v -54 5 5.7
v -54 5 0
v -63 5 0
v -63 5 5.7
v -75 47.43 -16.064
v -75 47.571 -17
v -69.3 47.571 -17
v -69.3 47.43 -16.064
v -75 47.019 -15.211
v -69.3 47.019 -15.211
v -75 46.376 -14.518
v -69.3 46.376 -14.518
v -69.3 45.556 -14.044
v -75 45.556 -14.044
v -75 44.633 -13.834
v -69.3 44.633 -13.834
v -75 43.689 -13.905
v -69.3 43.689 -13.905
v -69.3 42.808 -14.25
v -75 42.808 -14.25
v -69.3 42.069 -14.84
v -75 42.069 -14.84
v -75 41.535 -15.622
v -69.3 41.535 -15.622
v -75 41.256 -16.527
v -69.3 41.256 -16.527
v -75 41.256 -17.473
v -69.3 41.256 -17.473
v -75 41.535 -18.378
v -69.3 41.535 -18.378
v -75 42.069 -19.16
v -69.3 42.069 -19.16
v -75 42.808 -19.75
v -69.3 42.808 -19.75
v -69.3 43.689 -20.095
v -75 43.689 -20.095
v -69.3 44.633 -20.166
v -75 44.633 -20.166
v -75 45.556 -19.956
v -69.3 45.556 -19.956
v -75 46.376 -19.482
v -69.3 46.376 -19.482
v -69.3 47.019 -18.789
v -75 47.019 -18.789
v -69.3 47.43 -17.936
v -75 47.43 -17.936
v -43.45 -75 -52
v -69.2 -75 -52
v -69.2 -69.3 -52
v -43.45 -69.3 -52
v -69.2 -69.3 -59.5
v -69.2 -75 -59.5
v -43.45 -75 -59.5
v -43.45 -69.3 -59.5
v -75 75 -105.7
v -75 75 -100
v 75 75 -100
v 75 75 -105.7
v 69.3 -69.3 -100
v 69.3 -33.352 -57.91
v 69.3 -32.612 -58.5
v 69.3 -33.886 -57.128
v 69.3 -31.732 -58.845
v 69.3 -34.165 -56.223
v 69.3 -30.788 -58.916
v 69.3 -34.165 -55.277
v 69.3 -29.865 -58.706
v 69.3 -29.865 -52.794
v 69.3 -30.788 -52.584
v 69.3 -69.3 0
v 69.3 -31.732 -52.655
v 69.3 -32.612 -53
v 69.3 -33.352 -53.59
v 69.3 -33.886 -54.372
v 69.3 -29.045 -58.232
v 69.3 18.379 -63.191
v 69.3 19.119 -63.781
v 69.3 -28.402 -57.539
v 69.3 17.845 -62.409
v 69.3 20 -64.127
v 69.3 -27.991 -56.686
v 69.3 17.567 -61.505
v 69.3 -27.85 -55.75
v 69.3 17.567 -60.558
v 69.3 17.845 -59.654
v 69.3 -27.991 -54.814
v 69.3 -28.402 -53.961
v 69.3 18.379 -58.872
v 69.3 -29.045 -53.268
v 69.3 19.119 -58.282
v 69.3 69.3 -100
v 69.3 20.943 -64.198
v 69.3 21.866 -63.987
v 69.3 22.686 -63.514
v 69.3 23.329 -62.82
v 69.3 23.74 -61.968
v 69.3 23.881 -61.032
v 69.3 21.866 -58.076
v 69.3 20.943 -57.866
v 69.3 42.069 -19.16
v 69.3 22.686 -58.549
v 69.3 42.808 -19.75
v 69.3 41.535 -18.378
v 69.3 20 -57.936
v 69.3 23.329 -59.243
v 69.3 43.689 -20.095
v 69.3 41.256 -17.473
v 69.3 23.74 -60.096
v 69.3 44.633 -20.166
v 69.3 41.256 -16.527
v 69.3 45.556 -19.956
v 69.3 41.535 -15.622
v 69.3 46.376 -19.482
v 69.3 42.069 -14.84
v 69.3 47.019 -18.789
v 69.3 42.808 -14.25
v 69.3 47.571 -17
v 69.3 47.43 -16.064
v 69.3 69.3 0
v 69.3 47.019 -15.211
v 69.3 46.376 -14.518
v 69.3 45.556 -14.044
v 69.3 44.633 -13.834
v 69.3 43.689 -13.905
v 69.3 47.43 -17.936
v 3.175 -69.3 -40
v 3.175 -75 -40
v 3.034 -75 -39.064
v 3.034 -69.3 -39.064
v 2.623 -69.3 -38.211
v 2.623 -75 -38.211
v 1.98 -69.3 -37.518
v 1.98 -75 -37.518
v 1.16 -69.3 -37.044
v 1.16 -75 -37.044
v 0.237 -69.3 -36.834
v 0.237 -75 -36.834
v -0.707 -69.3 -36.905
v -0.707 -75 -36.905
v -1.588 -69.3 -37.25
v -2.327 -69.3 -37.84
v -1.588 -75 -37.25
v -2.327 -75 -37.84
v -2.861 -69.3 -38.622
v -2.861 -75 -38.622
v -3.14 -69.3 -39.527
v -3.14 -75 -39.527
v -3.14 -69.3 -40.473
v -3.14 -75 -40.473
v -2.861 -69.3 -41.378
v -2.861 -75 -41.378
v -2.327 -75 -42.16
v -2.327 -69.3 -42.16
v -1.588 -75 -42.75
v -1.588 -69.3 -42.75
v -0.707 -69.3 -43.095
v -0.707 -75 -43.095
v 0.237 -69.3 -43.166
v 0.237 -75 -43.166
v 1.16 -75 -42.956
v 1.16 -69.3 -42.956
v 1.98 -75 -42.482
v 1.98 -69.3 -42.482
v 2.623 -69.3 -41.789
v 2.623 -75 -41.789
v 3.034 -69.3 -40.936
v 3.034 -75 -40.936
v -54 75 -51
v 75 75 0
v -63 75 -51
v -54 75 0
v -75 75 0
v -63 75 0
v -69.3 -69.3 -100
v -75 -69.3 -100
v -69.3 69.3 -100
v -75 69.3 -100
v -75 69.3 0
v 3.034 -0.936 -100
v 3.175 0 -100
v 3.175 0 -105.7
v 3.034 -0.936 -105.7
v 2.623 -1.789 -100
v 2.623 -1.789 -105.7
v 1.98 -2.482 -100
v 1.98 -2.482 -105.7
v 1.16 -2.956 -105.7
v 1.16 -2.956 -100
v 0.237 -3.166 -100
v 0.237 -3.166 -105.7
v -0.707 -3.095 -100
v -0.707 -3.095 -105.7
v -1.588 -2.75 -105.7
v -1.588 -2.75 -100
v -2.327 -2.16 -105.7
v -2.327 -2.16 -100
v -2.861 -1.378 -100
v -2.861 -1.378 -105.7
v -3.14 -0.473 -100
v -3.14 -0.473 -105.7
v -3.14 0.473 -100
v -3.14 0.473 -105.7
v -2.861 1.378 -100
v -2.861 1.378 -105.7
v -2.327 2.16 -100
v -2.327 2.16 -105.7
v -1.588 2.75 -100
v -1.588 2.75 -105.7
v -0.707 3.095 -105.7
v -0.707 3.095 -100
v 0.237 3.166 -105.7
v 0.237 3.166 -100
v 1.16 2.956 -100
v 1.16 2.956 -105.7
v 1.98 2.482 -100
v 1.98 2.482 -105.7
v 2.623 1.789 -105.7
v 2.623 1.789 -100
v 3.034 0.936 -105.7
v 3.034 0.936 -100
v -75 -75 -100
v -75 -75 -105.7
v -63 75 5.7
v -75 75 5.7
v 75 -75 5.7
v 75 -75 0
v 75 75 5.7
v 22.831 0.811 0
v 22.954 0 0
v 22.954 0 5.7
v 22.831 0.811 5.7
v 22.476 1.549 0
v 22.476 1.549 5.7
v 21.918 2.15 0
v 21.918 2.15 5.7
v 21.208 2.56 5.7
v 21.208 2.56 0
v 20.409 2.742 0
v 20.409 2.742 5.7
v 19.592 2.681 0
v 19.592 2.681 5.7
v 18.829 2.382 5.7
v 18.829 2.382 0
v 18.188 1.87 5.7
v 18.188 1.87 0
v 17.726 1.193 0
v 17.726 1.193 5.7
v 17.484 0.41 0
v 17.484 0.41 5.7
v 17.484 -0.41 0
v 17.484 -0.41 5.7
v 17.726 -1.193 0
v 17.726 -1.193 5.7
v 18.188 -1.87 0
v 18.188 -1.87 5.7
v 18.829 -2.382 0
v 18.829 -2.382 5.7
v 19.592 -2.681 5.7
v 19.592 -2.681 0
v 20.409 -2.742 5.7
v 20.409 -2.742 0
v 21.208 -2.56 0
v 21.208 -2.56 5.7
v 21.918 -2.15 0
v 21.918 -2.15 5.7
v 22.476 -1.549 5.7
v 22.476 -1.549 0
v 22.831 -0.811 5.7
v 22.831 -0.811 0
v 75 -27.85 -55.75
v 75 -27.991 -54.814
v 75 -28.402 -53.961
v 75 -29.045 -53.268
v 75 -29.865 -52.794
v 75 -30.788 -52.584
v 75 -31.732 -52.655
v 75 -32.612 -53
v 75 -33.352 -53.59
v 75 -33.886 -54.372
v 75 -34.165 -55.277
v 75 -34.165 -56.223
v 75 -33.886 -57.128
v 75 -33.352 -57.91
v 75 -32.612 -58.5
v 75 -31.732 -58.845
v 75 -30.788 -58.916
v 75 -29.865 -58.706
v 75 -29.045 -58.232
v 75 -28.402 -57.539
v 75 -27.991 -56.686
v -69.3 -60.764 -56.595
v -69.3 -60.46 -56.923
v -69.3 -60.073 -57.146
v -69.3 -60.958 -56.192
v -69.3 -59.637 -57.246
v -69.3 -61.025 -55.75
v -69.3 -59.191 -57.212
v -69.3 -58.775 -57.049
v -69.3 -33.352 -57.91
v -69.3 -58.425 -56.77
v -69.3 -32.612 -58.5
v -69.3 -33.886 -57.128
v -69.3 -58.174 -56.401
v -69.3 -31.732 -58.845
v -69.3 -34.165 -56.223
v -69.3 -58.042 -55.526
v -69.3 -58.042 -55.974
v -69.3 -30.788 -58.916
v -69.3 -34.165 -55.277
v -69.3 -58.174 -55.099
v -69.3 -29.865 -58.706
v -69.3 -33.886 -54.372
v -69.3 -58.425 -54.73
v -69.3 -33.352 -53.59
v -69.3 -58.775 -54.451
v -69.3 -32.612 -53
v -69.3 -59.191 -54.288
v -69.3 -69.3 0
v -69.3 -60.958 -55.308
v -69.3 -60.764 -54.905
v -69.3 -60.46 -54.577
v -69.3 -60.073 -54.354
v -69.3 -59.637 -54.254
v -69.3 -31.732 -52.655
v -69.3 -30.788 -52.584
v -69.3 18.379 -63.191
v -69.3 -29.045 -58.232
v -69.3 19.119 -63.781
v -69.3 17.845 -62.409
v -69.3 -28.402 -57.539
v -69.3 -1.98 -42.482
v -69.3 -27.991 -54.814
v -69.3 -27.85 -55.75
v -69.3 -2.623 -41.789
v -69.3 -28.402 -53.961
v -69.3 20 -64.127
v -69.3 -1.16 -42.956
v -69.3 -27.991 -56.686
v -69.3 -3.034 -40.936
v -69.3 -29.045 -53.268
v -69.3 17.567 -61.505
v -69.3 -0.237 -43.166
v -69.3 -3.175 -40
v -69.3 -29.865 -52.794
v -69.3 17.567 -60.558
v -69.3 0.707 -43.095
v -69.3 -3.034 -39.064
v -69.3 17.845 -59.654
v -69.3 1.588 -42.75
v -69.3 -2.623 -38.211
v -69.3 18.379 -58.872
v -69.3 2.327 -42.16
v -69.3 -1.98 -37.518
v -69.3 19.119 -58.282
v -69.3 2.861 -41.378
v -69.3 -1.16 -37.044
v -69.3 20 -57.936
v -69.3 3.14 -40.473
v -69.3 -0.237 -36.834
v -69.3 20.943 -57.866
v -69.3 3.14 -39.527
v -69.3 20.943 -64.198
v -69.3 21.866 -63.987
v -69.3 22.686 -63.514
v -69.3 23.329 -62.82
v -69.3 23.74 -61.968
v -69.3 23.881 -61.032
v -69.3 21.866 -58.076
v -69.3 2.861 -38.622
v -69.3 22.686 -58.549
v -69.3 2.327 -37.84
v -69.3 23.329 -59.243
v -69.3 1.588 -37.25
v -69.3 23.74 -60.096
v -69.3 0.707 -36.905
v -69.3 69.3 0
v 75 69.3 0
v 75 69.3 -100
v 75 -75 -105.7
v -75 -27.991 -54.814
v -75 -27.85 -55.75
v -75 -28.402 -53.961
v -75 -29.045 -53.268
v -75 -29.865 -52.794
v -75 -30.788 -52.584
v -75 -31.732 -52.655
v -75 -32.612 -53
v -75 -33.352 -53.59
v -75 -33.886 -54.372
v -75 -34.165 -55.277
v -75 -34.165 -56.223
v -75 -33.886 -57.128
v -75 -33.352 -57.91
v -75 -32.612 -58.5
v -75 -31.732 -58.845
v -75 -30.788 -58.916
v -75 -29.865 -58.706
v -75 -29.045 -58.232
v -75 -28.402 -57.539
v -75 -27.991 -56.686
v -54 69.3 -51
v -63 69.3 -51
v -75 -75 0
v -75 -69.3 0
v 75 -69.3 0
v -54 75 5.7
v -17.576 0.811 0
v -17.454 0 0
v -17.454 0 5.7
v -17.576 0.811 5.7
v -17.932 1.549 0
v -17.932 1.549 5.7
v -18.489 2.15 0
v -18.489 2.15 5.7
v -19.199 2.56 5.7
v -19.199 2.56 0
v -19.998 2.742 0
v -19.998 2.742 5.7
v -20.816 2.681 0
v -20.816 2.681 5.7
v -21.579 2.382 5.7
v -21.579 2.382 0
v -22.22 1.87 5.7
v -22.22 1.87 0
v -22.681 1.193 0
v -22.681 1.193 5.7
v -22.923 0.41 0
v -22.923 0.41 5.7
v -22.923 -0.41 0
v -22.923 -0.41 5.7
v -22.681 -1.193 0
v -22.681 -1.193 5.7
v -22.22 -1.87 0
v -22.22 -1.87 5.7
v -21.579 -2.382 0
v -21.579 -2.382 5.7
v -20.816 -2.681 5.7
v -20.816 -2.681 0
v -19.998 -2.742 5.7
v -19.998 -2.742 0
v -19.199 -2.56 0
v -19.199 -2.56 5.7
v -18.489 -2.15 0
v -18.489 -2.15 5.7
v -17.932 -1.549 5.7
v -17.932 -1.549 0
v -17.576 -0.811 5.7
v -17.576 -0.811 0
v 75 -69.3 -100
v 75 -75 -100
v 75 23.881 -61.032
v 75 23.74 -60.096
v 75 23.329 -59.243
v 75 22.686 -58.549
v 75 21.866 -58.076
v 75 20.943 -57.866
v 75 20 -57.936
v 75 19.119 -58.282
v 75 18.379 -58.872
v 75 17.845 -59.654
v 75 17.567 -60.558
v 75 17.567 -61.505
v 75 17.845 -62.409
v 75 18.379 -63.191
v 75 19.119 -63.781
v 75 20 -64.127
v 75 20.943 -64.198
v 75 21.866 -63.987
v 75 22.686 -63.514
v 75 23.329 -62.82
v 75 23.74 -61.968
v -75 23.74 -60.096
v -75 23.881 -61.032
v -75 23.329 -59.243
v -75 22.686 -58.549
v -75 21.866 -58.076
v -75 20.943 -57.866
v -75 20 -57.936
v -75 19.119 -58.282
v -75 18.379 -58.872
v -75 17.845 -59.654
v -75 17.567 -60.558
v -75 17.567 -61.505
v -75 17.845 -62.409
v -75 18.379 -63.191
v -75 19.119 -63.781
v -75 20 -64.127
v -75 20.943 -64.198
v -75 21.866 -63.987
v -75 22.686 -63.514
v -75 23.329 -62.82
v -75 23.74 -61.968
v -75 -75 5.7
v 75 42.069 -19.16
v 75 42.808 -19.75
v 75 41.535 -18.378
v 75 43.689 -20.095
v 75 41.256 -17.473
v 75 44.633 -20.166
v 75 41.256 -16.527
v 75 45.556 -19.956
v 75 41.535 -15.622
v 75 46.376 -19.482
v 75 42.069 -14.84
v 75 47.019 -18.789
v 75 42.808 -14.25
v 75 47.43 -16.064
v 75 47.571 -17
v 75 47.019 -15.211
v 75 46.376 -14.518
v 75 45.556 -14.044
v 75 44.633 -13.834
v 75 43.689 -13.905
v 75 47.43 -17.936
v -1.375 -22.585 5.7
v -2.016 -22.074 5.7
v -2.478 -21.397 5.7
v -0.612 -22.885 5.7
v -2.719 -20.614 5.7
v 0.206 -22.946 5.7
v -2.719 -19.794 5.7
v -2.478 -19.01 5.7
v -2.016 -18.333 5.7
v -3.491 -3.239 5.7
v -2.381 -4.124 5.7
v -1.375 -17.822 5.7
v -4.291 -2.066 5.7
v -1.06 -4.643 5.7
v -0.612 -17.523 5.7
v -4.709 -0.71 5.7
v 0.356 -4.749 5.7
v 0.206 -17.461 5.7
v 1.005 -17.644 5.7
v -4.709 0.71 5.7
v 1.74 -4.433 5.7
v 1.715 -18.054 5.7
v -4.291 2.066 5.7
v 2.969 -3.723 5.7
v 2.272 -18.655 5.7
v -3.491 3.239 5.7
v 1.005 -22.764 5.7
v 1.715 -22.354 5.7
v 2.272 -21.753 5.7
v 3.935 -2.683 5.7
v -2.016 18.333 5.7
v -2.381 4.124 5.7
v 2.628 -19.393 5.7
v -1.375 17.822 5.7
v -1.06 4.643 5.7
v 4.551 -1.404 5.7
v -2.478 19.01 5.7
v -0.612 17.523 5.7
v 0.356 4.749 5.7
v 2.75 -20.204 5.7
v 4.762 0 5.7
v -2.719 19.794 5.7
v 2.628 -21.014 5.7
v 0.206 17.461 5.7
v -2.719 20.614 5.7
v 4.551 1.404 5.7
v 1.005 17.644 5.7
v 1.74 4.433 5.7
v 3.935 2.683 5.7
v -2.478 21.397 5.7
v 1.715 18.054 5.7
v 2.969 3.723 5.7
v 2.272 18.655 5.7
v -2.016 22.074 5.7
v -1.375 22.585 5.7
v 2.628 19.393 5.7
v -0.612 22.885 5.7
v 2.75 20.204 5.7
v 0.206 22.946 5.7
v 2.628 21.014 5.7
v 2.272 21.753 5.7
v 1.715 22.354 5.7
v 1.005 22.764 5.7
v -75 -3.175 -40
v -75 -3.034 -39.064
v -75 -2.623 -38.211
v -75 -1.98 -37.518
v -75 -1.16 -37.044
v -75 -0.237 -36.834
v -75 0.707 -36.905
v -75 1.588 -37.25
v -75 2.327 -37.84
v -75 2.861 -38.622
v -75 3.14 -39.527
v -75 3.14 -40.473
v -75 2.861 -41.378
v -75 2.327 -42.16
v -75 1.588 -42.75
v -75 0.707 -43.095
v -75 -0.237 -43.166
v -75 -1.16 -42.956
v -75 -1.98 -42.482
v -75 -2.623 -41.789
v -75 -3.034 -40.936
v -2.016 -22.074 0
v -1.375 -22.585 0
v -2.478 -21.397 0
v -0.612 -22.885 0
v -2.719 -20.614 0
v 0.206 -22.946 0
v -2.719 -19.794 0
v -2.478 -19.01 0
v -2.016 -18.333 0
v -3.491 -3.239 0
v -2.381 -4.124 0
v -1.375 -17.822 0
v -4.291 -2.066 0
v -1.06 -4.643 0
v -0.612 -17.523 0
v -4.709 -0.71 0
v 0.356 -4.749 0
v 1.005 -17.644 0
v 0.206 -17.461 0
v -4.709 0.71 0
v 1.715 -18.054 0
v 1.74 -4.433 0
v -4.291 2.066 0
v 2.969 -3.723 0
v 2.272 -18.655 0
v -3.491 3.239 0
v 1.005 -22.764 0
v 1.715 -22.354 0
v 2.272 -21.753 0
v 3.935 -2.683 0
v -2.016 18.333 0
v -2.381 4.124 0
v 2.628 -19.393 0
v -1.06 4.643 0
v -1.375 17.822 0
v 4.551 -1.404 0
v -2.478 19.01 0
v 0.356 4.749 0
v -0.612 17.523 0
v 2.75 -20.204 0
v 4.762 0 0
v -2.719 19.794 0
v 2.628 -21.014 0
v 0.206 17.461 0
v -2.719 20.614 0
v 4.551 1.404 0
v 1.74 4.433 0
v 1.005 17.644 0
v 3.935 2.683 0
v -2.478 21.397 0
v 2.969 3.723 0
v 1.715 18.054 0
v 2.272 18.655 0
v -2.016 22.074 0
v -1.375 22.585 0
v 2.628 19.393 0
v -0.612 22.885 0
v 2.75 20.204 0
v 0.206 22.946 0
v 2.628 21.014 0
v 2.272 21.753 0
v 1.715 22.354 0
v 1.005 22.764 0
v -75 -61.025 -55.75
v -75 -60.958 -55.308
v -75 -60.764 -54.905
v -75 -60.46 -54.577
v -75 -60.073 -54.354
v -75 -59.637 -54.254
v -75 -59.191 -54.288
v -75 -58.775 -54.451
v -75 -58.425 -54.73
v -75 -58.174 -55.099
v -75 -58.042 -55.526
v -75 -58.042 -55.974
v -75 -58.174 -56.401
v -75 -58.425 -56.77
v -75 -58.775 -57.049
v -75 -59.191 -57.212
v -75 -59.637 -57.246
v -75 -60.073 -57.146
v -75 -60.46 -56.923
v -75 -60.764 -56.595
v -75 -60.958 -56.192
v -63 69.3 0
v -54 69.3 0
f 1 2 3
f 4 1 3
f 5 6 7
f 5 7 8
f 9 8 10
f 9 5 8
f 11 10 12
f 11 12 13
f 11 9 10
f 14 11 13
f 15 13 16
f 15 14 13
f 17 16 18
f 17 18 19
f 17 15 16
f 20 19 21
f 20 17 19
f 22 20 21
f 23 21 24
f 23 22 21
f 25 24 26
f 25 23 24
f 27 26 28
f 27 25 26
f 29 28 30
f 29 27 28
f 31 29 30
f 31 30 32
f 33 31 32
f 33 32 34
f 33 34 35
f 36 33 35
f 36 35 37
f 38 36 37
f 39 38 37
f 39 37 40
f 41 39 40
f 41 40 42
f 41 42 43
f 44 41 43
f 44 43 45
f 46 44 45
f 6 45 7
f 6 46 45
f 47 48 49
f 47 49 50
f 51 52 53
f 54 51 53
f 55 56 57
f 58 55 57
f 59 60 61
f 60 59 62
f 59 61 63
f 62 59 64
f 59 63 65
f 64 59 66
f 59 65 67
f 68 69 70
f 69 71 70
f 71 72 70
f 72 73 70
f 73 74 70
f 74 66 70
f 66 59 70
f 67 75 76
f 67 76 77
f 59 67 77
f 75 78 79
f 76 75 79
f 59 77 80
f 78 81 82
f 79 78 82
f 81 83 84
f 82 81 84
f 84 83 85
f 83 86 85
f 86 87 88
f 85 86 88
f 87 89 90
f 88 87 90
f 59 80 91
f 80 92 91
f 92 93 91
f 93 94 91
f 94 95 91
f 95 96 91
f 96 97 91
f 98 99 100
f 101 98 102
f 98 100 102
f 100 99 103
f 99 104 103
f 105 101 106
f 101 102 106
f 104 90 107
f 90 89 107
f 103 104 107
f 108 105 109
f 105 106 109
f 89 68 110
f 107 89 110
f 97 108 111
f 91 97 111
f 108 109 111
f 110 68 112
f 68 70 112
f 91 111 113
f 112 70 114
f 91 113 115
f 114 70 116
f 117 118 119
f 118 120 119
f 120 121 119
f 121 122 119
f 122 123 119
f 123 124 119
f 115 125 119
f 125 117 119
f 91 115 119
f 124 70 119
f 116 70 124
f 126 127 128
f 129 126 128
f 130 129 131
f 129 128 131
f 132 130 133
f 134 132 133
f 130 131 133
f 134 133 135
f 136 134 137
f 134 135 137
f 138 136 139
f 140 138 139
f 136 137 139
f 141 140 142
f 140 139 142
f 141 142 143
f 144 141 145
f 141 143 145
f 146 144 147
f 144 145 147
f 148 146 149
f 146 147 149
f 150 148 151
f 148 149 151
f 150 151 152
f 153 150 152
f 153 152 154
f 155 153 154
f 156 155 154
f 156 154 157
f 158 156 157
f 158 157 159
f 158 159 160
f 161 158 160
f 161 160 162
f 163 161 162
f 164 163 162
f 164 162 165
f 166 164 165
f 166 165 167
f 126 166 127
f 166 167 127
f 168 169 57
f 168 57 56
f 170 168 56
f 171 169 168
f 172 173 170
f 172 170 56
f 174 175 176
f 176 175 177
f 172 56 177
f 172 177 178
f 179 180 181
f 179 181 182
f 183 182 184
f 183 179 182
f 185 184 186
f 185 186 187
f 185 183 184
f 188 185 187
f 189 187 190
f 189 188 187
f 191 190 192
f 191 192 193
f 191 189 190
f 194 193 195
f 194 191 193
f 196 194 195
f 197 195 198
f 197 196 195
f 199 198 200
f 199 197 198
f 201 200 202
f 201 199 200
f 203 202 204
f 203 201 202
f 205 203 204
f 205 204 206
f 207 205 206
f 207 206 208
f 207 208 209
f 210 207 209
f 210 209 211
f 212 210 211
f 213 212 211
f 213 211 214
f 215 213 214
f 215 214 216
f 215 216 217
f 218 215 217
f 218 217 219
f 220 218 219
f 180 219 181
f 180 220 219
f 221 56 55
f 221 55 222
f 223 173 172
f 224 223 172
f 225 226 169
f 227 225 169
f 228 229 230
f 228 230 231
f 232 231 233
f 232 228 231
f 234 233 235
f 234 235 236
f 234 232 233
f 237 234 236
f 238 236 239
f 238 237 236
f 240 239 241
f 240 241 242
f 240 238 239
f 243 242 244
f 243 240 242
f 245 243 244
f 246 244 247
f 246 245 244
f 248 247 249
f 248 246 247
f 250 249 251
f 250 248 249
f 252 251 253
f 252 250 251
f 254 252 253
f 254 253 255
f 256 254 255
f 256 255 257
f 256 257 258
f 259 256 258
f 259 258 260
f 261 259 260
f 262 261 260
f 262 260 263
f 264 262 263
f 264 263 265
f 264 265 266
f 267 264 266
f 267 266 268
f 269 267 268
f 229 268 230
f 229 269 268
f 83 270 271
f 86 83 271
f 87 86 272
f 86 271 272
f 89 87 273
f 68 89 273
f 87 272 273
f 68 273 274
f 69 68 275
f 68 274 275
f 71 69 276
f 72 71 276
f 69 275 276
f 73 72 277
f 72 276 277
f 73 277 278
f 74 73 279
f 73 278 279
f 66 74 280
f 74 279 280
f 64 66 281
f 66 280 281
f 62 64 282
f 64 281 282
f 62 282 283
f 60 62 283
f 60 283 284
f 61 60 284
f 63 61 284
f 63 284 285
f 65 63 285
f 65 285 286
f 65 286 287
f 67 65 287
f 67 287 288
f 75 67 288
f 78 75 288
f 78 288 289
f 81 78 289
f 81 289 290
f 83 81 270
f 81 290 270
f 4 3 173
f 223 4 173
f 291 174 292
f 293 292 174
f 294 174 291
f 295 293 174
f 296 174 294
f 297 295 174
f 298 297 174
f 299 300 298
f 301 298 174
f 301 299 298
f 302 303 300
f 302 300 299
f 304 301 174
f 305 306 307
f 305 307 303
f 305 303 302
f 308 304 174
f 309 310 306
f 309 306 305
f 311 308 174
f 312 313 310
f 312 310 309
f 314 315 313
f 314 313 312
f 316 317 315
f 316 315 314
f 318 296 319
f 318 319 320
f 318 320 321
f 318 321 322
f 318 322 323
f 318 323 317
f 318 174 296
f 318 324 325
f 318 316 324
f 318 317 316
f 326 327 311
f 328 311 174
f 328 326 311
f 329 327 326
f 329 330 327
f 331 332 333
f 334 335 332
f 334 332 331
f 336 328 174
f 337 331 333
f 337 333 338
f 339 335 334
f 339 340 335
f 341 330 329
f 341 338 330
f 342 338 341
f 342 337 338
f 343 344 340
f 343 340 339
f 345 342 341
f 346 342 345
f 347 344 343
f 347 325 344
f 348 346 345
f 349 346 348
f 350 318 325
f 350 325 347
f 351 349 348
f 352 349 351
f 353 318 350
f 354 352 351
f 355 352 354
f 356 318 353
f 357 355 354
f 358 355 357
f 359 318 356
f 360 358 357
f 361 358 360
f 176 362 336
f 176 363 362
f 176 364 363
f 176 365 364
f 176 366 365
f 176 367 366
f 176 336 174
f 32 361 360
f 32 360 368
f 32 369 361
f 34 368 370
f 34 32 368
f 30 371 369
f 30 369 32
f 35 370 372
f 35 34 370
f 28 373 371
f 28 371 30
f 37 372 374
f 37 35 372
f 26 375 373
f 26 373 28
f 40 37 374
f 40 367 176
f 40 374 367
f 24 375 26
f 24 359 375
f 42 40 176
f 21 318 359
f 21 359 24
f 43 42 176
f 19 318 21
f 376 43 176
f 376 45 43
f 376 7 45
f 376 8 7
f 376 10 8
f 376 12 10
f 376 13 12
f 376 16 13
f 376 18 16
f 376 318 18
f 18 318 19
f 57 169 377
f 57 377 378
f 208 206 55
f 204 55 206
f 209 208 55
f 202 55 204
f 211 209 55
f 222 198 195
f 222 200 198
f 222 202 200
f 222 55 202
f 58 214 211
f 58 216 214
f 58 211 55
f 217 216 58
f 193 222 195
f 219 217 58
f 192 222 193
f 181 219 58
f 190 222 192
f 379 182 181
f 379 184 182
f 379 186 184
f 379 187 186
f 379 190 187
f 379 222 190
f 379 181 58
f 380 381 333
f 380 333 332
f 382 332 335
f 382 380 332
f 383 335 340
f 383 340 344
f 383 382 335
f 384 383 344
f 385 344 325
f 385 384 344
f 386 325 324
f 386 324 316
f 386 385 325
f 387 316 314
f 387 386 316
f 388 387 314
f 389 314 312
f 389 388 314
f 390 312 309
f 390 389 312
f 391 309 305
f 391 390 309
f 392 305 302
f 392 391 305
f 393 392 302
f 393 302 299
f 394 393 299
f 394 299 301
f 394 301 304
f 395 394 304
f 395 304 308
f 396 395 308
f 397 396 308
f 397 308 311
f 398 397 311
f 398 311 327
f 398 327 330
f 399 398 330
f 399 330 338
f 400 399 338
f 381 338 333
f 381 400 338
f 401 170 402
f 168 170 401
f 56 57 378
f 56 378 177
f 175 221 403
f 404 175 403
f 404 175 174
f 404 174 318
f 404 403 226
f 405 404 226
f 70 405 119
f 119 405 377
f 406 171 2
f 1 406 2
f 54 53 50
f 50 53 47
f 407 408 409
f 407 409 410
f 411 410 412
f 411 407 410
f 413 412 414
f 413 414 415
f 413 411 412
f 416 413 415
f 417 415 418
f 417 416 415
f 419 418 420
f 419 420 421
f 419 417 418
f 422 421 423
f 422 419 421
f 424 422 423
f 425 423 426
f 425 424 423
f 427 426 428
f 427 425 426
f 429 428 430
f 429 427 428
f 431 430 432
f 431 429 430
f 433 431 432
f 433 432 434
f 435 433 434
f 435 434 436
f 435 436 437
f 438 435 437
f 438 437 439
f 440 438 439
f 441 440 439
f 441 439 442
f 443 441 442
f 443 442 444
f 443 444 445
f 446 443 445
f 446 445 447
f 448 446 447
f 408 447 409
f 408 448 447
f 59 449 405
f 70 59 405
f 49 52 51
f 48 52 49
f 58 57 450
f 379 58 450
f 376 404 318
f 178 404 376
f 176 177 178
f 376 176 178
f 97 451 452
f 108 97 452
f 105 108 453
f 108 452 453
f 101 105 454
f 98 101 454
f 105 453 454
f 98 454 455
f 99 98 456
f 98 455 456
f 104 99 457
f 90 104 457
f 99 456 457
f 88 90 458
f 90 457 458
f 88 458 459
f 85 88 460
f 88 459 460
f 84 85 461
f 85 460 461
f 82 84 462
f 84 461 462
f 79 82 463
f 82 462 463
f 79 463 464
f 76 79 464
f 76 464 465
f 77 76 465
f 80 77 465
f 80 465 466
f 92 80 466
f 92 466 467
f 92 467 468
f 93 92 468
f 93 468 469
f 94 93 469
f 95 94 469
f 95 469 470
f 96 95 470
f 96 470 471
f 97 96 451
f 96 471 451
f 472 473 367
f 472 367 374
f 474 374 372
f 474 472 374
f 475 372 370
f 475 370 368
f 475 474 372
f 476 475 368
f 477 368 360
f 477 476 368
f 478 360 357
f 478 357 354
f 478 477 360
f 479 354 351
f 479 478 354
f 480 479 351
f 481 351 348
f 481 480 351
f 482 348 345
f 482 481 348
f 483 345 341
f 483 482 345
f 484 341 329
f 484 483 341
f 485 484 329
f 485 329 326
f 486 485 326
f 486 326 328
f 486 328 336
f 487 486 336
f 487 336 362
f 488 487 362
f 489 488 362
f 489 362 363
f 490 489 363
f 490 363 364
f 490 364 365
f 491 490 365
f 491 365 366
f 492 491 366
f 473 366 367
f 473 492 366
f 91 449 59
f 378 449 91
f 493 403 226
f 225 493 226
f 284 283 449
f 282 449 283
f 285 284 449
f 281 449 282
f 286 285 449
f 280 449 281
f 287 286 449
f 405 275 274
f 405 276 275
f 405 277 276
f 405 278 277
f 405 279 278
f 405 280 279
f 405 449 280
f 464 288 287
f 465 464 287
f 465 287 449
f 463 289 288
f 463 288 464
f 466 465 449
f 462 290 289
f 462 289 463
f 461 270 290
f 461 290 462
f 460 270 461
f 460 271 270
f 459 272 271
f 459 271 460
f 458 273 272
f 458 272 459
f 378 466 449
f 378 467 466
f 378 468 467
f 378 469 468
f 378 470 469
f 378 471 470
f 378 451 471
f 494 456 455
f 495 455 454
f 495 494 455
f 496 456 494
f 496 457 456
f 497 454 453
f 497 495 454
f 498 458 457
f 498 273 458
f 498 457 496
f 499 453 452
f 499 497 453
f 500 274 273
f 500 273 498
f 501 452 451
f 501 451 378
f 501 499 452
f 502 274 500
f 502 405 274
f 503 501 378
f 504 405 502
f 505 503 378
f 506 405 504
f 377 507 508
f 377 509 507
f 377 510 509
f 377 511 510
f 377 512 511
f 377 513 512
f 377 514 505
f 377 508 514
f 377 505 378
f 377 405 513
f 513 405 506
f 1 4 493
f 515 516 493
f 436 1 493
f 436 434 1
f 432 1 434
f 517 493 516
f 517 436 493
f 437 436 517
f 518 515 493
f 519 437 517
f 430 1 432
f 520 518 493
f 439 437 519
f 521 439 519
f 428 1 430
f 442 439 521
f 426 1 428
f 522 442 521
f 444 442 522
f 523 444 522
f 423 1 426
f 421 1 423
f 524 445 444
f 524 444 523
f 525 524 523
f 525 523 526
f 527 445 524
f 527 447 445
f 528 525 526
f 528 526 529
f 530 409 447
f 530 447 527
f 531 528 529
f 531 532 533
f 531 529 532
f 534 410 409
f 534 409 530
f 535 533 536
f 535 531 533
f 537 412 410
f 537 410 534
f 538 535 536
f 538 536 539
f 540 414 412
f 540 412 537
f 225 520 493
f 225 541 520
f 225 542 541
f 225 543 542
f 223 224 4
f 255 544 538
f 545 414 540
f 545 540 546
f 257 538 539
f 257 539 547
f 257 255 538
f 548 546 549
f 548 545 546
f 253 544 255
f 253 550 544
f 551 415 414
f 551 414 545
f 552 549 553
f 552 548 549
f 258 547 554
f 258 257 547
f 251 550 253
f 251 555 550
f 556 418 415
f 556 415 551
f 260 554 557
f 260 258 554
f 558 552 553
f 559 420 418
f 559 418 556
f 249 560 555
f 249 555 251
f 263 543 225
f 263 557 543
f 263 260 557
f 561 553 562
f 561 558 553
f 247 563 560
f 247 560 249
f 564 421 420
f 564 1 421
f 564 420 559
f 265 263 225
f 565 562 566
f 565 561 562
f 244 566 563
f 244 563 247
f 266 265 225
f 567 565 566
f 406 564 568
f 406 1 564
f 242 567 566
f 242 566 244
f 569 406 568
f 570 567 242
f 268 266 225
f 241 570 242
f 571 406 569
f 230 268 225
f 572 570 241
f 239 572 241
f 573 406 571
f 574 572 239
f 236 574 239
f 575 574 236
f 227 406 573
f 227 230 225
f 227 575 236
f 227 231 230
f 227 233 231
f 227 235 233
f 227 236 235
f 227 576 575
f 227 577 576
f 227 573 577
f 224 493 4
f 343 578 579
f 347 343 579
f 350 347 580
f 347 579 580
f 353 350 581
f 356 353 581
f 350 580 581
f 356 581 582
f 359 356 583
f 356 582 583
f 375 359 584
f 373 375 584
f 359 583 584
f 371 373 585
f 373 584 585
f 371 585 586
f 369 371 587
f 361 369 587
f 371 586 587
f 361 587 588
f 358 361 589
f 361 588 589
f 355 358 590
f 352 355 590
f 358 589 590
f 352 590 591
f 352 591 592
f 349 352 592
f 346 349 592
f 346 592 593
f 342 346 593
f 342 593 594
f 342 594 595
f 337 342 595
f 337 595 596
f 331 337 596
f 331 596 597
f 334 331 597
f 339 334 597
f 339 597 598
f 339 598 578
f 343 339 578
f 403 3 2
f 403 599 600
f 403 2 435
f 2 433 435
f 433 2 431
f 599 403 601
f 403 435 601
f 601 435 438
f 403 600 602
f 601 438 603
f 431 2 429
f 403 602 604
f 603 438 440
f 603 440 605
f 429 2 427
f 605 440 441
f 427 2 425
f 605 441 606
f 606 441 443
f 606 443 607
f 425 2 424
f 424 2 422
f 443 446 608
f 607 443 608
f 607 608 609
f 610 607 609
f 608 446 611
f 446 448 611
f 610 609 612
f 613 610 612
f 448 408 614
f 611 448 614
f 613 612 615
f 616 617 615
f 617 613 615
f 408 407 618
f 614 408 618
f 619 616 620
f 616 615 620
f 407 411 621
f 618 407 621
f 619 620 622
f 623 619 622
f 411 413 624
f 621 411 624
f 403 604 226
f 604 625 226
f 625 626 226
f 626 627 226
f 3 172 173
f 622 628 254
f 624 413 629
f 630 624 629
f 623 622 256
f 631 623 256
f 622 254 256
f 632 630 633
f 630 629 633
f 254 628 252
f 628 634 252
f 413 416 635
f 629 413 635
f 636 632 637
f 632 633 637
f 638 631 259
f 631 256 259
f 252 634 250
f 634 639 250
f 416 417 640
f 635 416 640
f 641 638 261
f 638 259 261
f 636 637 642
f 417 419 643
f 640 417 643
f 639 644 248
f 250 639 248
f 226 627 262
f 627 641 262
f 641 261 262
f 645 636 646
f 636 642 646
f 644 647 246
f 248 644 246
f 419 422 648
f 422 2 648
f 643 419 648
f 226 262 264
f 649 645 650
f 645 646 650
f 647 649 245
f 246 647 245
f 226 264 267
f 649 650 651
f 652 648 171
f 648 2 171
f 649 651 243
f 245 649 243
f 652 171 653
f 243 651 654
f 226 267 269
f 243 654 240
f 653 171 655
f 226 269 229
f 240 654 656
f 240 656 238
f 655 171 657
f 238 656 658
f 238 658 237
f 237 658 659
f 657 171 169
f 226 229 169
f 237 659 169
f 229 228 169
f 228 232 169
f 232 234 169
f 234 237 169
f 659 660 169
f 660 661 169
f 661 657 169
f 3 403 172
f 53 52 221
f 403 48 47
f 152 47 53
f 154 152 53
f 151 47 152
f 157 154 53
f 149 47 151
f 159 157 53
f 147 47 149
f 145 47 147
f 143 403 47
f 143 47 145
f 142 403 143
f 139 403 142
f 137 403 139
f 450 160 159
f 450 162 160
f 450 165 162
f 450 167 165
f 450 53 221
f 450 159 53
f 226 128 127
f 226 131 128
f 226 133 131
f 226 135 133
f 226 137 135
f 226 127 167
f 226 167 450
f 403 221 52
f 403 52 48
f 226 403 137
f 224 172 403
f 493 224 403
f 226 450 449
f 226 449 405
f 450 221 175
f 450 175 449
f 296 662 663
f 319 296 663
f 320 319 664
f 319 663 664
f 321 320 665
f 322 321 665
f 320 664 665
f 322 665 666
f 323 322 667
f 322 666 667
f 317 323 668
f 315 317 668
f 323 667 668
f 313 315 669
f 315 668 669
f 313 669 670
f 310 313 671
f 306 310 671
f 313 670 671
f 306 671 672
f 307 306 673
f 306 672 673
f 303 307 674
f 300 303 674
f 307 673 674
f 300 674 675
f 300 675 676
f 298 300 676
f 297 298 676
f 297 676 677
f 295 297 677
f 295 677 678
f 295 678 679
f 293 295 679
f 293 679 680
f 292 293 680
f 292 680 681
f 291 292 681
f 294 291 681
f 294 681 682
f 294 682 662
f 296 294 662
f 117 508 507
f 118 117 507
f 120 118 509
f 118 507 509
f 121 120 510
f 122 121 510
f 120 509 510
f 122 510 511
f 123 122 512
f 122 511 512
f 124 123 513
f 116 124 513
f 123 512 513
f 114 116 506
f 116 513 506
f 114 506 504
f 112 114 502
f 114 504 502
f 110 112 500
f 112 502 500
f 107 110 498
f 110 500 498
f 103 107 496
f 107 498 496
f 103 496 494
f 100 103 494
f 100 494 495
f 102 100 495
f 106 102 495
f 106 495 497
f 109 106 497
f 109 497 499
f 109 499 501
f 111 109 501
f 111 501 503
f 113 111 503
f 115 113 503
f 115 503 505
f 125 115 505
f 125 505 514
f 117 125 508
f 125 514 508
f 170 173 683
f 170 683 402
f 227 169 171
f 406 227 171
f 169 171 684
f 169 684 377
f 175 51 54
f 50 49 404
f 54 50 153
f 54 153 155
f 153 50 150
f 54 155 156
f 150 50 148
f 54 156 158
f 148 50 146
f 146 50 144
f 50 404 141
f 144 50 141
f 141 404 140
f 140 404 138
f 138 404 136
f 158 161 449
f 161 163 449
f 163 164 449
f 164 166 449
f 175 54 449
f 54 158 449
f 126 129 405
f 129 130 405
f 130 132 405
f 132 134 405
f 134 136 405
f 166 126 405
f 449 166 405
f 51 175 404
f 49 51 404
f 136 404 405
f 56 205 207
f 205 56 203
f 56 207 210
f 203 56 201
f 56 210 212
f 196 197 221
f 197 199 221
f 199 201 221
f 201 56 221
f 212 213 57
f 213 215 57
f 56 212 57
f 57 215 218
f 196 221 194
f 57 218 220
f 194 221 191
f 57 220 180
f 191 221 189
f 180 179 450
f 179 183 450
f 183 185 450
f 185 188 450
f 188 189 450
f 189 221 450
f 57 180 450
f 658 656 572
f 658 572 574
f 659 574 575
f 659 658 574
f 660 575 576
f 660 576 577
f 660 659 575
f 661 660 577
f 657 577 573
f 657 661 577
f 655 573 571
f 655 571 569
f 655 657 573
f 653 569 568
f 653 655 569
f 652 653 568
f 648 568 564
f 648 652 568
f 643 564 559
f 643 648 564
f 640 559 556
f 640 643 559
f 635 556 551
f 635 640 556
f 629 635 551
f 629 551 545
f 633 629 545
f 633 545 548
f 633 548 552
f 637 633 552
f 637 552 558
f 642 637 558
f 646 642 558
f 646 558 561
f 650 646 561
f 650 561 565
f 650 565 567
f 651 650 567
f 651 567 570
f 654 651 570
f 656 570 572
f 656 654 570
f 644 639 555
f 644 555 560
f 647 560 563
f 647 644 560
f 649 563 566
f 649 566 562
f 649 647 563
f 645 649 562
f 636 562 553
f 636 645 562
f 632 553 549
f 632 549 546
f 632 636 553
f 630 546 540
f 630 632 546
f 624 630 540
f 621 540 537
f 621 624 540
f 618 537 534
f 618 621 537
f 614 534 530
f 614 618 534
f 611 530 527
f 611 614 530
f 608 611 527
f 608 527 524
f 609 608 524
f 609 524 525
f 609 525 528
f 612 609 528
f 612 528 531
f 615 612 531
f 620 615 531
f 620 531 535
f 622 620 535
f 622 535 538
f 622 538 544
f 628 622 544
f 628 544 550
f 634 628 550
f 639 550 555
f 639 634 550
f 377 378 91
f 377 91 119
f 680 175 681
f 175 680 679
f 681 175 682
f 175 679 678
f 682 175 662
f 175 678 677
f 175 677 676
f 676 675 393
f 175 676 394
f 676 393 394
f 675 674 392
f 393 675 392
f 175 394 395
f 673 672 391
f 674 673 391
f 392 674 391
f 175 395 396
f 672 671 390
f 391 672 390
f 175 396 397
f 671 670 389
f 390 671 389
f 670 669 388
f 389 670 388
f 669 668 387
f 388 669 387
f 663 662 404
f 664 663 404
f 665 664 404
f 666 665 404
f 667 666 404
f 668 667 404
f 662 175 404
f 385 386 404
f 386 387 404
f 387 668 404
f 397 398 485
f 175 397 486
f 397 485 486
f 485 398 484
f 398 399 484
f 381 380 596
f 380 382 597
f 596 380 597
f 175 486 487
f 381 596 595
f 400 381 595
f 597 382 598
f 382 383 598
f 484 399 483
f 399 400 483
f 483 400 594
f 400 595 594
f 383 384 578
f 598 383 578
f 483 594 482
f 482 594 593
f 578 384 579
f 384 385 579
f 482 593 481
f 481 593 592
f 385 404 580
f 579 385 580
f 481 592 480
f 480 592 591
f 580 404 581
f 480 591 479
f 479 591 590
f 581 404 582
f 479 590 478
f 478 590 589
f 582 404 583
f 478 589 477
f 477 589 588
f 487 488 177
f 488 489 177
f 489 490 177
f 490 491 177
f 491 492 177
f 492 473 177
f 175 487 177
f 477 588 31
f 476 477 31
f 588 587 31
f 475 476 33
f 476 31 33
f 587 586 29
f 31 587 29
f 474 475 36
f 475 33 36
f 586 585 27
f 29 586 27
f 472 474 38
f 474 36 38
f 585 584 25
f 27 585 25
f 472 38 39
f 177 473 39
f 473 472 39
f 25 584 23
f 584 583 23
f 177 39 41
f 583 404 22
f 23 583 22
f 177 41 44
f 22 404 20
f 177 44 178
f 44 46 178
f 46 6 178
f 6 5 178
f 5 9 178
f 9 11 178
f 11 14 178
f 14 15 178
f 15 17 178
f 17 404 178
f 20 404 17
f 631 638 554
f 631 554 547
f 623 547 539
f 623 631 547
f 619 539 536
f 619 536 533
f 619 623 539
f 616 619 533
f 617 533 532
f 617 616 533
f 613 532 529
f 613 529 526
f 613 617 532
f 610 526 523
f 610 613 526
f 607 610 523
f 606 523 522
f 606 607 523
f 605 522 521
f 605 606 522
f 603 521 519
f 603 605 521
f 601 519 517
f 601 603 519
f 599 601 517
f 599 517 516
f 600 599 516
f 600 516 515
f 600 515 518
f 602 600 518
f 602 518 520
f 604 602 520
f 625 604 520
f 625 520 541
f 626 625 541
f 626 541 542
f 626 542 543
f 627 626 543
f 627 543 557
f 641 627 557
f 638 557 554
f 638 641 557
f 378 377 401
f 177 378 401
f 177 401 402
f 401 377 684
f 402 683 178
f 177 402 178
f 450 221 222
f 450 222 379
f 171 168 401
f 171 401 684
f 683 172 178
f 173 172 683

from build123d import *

# Parameters (mm, degrees)
F0_R      = 2.75
F0_R_2    = 4.7625
F1_DEPTH  = 5.7
F2_W      = 150
F2_H      = 100
F2_W_2    = 25.75
F2_H_2    = 7.5
F2_R      = 3.175
F3_DEPTH  = 5.7
F4_W      = 138.6
F4_H      = 100
F4_R      = 3.175
F5_DEPTH  = 5.7
F6_W      = 150
F6_H      = 150
F6_R      = 3.175
F7_DEPTH  = 5.7
F11_DEPTH = 5.7
F8_R      = 1.5
F8_R_2    = 3.175
F12_DEPTH = 25


with BuildPart() as f1:
    # F0 (on Top) → F1 (new body)
    with BuildSketch(Plane.XY):
        Polygon((75, -75), (75, 75), (-54, 75), (-54, 5), (-63, 5), (-63, 75), (-75, 75), (-75, -75), align=None)
        with Locations((0, -20.203669)):
            Circle(F0_R, mode=Mode.SUBTRACT)
        with Locations((-20.203669, 0)):
            Circle(F0_R, mode=Mode.SUBTRACT)
        Circle(F0_R_2, mode=Mode.SUBTRACT)
        with Locations((20.203669, 0)):
            Circle(F0_R, mode=Mode.SUBTRACT)
        with Locations((0, 20.203669)):
            Circle(F0_R, mode=Mode.SUBTRACT)
    extrude(amount=F1_DEPTH)


with BuildPart() as f3:
    # F2 (on face) → F3 (new body)
    with BuildSketch(Plane.XZ.offset(75)):
        with Locations((0, -50)):
            Rectangle(F2_W, F2_H)
        with Locations((-56.325, -55.75)):
            Rectangle(F2_W_2, F2_H_2, mode=Mode.SUBTRACT)
        with Locations((0, -40)):
            Circle(F2_R, mode=Mode.SUBTRACT)
    extrude(amount=-F3_DEPTH)


with BuildPart() as f5:
    # F4 (on face) → F5 (new body)
    with BuildSketch(Plane.YZ.offset(75)):
        with Locations((0, -50)):
            Rectangle(F4_W, F4_H)
        with Locations((-31.025, -55.75)):
            Circle(F4_R, mode=Mode.SUBTRACT)
        with Locations((20.706071, -61.031691)):
            Circle(F4_R, mode=Mode.SUBTRACT)
        with Locations((44.395946, -17)):
            Circle(F4_R, mode=Mode.SUBTRACT)
    extrude(amount=-F5_DEPTH)


with BuildPart() as f7:
    # F6 (on face) → F7 (new body)
    with BuildSketch(Plane(origin=(0, 0, -100), x_dir=(1, 0, 0), z_dir=(0, 0, -1))):
        Rectangle(F6_W, F6_H)
        Circle(F6_R, mode=Mode.SUBTRACT)
    extrude(amount=F7_DEPTH)


with BuildPart() as f9_1:
    # F9: instance of F5
    add(f5.part.mirror(Plane.YZ))

    # F8 (on face) → F12 (cut)
    with BuildSketch(Plane(origin=(-75, 0, 0), x_dir=(0, -1, 0), z_dir=(-1, 0, 0))):
        with Locations((59.525, -55.75)):
            Circle(F8_R)
        with Locations((0, -40)):
            Circle(F8_R_2)
    extrude(amount=-F12_DEPTH, mode=Mode.SUBTRACT)


with BuildPart() as f11:
    # F10 (on face) → F11 (new body)
    with BuildSketch(Plane(origin=(0, 75, 0), x_dir=(-1, 0, 0), z_dir=(0, 1, 0))):
        Polygon((54, 0), (-75, 0), (-75, -100), (75, -100), (75, 0), (63, 0), (63, -51), (54, -51), align=None)
    extrude(amount=-F11_DEPTH)


solid = Compound([f1.part, f3.part, f5.part, f7.part, f9_1.part, f11.part])
